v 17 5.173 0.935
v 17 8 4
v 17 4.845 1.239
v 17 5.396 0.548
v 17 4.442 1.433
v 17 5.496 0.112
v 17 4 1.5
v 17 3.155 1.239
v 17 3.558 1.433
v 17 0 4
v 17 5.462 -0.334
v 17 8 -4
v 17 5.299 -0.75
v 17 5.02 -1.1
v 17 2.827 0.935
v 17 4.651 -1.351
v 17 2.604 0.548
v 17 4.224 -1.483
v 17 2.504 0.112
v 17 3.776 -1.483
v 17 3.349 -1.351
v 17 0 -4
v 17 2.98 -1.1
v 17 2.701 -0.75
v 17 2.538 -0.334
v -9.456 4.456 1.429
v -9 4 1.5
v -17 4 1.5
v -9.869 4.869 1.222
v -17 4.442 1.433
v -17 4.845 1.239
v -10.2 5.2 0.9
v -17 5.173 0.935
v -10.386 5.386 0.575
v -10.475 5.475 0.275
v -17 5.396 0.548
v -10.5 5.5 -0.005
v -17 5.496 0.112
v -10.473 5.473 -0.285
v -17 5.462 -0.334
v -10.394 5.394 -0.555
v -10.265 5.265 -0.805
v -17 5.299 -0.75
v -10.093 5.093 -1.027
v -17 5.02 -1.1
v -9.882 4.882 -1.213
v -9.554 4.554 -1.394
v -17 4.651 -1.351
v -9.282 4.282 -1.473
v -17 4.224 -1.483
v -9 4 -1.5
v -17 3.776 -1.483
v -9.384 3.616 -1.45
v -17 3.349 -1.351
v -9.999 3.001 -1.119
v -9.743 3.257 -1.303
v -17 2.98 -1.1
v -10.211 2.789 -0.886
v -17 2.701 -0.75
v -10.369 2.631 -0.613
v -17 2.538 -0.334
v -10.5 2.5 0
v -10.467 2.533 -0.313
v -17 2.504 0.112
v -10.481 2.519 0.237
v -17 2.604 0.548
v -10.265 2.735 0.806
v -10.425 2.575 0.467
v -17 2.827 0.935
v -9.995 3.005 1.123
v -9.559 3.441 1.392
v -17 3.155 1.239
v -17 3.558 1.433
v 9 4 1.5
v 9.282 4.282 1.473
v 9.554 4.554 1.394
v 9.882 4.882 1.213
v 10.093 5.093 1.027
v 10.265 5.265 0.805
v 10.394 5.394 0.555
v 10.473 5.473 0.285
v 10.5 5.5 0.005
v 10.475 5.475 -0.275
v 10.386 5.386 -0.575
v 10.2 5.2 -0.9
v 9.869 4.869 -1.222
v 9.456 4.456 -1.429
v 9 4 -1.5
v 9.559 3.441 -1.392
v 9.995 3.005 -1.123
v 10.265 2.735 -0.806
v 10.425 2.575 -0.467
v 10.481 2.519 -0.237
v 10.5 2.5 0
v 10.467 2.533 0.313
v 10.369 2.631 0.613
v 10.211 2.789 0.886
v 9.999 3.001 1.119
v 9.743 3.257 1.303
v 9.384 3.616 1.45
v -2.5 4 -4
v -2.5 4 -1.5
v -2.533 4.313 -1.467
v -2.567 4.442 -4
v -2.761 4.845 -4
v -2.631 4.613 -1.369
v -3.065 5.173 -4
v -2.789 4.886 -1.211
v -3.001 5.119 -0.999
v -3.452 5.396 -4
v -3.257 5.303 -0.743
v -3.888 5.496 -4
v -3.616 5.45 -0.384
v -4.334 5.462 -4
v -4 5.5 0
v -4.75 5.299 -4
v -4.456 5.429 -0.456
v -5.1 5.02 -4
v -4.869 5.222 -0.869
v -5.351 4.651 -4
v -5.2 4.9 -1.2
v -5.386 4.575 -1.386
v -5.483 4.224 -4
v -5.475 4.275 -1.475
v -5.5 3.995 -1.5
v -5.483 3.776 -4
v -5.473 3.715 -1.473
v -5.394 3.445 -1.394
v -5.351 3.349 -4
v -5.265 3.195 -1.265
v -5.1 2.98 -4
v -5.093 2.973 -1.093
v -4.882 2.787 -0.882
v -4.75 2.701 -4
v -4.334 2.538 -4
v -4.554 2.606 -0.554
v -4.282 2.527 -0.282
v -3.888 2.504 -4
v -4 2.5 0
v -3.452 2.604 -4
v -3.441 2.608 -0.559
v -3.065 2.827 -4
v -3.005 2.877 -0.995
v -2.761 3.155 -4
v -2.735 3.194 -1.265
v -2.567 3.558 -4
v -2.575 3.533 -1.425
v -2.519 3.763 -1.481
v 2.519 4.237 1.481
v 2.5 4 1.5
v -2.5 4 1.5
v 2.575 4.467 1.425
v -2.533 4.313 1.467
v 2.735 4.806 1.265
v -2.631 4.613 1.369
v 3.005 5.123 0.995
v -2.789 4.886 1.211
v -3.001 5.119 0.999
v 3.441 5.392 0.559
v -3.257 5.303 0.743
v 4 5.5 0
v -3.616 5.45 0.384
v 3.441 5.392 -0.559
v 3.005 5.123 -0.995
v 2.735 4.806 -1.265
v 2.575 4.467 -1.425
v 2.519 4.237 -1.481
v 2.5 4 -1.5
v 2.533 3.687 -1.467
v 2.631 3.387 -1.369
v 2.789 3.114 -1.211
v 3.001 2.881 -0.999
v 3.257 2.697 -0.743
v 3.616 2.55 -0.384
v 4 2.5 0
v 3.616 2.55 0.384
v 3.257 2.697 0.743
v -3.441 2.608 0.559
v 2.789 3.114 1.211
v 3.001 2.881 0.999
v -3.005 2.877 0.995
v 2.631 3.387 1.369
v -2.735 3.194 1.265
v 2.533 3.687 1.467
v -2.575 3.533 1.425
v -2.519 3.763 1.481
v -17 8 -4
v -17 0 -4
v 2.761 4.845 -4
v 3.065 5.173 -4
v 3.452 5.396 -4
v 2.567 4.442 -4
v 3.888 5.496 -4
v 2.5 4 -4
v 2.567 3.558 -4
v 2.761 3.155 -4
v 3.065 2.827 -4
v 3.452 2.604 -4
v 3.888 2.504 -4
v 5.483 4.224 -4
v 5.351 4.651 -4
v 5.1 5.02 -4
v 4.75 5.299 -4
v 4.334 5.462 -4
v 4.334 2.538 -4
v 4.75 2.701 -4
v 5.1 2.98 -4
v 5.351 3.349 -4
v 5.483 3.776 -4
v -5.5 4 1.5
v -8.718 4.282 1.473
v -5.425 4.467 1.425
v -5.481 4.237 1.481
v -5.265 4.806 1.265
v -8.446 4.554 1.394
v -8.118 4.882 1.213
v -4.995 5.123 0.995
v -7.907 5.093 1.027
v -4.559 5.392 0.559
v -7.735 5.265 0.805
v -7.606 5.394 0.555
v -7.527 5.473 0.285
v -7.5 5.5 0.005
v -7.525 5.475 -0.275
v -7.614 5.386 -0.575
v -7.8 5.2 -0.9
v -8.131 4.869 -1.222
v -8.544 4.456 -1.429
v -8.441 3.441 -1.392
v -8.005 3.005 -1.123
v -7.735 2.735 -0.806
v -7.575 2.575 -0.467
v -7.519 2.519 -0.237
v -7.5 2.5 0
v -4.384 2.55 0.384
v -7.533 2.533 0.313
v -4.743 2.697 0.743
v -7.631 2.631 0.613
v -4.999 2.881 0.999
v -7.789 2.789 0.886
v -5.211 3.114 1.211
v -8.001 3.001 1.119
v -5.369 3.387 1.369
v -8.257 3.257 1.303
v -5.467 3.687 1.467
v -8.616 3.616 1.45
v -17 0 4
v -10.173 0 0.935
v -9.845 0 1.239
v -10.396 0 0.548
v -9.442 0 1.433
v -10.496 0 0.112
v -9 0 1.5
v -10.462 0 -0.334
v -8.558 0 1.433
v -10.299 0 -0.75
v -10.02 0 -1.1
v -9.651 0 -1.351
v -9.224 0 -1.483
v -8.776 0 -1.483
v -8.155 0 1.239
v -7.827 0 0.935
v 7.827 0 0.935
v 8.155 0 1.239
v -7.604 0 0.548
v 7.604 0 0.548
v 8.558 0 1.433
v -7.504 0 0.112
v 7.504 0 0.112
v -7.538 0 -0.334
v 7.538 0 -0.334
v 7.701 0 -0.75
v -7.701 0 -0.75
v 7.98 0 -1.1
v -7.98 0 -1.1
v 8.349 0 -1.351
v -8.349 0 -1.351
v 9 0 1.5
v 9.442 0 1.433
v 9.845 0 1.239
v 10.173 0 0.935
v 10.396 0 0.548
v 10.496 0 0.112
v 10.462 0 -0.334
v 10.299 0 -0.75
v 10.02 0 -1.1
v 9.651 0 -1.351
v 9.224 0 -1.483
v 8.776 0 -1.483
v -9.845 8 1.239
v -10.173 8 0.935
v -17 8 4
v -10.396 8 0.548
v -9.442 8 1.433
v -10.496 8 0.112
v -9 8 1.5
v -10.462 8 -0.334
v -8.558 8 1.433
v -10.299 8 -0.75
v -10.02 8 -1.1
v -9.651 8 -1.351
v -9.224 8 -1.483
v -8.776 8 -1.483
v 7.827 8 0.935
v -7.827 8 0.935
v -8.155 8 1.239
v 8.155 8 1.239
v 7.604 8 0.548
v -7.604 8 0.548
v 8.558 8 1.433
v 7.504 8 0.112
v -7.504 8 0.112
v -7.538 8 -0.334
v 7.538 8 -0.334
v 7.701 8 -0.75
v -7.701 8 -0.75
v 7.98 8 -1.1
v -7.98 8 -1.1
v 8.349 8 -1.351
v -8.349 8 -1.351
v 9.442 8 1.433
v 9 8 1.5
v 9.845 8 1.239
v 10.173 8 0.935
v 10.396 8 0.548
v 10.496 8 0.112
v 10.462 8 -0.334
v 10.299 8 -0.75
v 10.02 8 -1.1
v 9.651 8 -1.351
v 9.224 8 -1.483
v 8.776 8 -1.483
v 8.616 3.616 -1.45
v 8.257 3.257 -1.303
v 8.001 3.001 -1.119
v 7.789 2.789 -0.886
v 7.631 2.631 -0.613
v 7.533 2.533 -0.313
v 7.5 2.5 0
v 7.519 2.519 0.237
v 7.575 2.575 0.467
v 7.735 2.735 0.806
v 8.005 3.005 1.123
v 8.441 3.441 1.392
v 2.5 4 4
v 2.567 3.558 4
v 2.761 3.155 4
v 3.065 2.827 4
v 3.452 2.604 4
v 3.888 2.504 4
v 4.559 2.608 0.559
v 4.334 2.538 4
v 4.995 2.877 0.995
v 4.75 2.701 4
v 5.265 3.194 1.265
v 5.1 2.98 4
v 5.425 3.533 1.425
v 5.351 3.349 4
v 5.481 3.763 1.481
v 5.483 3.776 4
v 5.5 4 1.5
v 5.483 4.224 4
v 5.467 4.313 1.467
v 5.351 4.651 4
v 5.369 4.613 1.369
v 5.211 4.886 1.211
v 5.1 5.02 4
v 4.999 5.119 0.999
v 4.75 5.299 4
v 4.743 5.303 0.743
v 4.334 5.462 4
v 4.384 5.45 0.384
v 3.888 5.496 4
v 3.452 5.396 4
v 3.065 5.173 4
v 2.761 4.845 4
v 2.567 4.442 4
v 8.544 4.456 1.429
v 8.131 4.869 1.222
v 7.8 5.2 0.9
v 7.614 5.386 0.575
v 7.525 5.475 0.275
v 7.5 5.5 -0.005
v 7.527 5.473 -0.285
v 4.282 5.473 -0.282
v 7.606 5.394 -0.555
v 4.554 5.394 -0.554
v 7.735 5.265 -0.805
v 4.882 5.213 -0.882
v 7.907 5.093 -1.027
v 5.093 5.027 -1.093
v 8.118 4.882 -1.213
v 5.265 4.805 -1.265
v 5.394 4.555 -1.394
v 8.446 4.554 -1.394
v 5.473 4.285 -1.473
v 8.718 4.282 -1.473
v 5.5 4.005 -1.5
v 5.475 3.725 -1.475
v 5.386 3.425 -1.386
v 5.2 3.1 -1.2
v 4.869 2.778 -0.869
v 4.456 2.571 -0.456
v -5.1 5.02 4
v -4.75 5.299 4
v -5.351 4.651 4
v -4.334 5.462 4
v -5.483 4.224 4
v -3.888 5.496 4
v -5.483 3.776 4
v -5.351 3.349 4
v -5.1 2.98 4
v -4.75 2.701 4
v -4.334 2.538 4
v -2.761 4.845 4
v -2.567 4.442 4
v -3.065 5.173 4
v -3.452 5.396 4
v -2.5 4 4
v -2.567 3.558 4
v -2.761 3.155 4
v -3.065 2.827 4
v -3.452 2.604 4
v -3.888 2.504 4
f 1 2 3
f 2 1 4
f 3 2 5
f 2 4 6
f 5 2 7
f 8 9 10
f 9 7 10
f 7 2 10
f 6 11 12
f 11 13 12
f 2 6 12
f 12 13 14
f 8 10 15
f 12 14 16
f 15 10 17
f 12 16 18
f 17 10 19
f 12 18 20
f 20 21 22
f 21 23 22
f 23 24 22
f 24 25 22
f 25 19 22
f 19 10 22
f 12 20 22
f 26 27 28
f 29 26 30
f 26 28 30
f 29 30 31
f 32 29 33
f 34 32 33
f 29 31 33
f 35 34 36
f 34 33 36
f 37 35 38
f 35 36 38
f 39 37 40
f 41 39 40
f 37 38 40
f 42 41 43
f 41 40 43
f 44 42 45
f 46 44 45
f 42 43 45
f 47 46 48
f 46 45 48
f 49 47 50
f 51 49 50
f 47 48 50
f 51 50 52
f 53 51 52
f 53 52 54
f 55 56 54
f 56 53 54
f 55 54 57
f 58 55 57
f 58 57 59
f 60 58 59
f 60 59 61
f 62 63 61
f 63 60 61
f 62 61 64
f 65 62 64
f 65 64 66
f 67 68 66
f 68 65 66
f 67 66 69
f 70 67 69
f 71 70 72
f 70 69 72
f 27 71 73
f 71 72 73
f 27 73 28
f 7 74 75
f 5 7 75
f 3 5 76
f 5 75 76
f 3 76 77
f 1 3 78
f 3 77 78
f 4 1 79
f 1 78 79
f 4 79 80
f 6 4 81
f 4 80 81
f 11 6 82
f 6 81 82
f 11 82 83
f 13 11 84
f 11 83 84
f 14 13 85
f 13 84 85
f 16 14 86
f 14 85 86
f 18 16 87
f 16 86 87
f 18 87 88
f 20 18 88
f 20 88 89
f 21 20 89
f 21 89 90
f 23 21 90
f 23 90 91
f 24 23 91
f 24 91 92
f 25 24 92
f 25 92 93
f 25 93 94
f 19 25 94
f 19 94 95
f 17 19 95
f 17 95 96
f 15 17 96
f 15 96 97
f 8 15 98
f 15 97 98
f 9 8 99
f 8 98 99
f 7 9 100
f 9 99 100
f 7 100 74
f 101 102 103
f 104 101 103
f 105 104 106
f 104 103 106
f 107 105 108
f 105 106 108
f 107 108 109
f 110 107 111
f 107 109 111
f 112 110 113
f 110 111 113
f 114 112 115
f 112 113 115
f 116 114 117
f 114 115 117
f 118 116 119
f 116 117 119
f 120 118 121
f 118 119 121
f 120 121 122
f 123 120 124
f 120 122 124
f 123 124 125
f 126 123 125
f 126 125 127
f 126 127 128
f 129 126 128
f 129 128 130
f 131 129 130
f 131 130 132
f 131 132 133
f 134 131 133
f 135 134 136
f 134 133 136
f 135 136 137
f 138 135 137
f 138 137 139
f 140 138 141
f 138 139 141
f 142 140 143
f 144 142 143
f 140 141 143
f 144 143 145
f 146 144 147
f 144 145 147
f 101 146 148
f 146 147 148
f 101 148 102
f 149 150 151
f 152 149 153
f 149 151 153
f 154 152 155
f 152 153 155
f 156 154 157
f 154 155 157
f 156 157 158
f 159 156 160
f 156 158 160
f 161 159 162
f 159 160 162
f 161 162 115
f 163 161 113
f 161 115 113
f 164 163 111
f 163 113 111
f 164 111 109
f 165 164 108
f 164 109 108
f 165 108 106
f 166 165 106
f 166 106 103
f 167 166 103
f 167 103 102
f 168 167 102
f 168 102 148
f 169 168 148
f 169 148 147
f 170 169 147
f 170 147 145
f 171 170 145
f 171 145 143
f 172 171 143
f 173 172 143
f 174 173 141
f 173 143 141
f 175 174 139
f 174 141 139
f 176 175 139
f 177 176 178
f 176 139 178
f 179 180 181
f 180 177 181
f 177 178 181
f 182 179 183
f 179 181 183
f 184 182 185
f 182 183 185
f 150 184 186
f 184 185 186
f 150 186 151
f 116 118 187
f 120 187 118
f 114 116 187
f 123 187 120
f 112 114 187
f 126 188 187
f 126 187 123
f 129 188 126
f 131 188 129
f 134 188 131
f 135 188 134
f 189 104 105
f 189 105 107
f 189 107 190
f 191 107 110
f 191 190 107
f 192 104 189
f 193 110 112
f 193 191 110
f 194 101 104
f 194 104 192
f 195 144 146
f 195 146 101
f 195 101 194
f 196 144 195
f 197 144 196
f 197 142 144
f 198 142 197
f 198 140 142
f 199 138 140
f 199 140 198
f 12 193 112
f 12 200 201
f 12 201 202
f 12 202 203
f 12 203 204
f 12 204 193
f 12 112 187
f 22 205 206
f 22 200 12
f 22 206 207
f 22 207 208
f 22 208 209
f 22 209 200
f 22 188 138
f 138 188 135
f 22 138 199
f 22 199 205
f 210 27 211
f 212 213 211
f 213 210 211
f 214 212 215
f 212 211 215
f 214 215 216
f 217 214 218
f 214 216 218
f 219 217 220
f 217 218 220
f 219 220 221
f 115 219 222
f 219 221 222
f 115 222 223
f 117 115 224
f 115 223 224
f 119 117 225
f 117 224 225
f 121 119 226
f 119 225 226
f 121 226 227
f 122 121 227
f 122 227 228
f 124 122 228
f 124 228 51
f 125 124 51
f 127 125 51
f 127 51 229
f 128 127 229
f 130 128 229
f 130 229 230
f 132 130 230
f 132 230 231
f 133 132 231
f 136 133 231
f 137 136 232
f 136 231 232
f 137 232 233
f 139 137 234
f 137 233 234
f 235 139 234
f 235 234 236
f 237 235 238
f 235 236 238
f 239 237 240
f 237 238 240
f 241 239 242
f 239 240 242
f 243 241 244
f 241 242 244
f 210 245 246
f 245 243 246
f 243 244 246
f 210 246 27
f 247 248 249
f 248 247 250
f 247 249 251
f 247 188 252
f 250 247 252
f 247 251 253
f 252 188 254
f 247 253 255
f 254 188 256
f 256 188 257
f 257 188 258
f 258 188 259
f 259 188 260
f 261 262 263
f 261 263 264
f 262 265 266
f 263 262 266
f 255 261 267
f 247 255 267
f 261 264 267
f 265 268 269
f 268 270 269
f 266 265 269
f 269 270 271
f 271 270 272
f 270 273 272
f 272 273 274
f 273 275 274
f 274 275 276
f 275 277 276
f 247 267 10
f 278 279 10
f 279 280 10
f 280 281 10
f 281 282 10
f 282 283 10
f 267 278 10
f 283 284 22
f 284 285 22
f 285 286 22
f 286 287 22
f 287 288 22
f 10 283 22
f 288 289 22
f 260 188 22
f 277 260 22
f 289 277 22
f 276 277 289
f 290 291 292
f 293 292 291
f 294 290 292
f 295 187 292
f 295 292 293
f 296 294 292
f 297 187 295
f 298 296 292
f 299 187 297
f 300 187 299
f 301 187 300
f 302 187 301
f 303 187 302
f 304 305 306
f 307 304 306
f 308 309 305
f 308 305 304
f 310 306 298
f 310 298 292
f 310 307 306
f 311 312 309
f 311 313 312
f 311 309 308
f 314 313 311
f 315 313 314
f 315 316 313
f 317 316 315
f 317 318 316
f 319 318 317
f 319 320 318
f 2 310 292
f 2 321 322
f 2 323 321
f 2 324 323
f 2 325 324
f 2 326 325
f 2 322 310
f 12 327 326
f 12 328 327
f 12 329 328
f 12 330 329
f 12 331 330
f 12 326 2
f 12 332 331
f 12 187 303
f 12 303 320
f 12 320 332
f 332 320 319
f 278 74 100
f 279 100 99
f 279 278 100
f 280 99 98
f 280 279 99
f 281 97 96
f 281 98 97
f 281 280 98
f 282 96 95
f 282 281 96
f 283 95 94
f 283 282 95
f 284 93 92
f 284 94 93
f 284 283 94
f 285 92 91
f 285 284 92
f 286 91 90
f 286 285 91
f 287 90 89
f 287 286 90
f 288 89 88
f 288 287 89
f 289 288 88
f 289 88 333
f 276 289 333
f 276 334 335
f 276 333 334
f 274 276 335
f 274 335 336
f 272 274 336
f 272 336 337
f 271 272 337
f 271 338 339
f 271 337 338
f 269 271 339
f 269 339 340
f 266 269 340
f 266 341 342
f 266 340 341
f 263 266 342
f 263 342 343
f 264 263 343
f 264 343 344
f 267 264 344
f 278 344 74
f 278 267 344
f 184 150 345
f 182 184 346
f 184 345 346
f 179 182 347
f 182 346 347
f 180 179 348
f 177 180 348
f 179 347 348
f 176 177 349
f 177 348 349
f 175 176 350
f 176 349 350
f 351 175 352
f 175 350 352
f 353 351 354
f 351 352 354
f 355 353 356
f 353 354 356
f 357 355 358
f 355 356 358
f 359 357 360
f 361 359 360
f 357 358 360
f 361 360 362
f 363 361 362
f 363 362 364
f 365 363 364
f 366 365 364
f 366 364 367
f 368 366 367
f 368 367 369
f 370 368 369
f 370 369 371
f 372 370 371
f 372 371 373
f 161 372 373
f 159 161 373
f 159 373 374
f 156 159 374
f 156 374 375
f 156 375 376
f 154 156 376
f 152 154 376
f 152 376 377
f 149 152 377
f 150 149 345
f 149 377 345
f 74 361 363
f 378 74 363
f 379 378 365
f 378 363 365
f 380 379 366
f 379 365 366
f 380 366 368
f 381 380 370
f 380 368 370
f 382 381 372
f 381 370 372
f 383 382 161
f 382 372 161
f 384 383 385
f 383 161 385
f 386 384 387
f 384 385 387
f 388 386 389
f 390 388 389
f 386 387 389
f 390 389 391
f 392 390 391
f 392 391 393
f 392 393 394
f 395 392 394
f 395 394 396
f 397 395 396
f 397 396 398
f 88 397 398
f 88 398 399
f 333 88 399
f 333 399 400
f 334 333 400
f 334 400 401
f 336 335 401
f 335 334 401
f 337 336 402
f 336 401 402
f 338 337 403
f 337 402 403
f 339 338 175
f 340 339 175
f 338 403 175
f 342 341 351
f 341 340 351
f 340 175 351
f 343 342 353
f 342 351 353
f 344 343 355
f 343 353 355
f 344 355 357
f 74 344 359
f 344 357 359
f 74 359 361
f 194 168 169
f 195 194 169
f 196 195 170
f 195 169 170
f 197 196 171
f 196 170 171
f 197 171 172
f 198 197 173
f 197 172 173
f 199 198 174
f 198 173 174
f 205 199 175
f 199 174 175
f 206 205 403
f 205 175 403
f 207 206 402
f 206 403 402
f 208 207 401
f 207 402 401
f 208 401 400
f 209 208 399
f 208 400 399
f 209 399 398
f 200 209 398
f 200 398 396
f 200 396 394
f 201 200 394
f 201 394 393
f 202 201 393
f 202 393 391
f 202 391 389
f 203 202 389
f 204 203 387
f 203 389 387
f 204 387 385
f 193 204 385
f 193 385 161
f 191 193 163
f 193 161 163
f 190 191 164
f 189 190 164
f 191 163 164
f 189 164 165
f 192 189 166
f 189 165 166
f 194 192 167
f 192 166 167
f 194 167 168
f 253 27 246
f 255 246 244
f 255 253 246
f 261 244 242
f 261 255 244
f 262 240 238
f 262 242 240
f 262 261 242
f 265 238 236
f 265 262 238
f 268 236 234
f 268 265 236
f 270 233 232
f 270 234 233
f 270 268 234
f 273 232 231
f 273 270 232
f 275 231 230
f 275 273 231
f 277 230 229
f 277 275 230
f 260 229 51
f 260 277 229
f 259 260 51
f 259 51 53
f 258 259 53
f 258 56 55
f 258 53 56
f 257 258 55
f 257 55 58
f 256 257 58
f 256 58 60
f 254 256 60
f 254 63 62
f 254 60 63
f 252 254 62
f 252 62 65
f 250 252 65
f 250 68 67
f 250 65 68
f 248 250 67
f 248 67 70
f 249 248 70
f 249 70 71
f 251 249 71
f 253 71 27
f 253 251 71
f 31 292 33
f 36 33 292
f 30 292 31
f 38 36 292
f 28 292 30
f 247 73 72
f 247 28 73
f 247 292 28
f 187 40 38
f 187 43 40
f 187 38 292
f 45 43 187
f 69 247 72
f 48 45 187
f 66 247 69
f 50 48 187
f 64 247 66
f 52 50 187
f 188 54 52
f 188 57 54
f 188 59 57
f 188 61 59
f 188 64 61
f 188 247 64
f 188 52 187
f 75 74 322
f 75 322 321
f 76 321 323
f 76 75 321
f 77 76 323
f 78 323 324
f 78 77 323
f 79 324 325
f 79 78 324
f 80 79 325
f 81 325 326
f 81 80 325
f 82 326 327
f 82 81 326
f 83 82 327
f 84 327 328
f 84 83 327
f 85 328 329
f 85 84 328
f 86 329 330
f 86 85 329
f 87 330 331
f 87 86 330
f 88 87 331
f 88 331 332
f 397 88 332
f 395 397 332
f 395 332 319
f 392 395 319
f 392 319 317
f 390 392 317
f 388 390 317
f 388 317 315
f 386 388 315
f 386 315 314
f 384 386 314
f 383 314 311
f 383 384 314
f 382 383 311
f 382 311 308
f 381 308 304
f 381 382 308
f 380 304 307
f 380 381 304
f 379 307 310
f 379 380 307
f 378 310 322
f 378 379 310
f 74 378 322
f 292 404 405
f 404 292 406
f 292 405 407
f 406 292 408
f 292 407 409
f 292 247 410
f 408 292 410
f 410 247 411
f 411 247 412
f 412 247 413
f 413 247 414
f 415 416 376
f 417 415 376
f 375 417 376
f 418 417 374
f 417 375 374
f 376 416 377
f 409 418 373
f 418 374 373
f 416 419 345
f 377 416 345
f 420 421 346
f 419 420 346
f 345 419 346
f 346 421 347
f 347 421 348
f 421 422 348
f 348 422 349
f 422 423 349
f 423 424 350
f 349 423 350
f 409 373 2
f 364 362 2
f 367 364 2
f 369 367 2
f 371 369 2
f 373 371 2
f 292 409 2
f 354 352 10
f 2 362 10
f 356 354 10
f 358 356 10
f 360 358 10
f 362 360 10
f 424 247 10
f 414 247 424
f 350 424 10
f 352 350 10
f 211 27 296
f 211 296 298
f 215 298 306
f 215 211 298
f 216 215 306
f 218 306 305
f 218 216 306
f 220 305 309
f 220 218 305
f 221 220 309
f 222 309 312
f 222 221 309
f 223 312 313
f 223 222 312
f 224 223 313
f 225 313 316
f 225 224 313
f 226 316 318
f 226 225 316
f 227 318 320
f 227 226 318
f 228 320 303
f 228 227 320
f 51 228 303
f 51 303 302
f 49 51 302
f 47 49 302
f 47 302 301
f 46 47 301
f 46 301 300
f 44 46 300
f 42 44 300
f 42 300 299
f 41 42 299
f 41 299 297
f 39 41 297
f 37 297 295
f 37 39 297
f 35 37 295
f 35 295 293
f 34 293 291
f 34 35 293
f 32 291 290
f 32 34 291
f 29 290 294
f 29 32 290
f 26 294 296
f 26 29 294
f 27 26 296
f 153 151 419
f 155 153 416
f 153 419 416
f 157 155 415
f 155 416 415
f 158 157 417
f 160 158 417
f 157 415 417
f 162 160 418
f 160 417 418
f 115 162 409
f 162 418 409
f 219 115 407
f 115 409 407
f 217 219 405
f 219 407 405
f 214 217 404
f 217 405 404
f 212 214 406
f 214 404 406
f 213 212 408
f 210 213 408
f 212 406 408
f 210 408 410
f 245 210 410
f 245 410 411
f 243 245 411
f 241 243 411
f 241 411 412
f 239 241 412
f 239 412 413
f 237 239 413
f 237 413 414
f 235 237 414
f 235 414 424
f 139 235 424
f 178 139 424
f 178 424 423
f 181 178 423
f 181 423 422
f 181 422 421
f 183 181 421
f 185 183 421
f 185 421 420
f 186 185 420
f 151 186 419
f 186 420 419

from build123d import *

# Parameters (mm, degrees)
SKETCH_1_W          = 34
SKETCH_1_H          = 8
SKETCH_1_R          = 1.5
EXTRUDE_1_DEPTH     = 8
SKETCH_2_R          = 1.5
CUT_EXTRUDE_1_DEPTH = 8
SKETCH_3_R          = 1.5
CUT_EXTRUDE_2_DEPTH = 39


with BuildPart() as part:
    # 草图1 → 凸台-拉伸1 (new body)
    with BuildSketch(Plane(origin=(0, 0, 0), x_dir=(1, 0, 0), z_dir=(0, 1, 0))):
        Rectangle(SKETCH_1_W, SKETCH_1_H)
        with Locations(Location((-9, 0, 0), (0, 0, 270))):
            Circle(SKETCH_1_R, mode=Mode.SUBTRACT)
        with Locations(Location((9, 0, 0), (0, 0, 270))):
            Circle(SKETCH_1_R, mode=Mode.SUBTRACT)
    extrude(amount=EXTRUDE_1_DEPTH)

    # 草图2 → 切除-拉伸1 (cut)
    with BuildSketch(Plane.XY.offset(4)):
        with Locations((-4, 4)):
            Circle(SKETCH_2_R)
        with Locations(Location((4, 4, 0), (0, 0, 180))):
            Circle(SKETCH_2_R)
    extrude(amount=-CUT_EXTRUDE_1_DEPTH, mode=Mode.SUBTRACT)

    # 草图3 → 切除-拉伸2 (cut)
    with BuildSketch(Plane.ZY.offset(17)):
        with Locations((0, 4)):
            Circle(SKETCH_3_R)
    extrude(amount=-CUT_EXTRUDE_2_DEPTH, mode=Mode.SUBTRACT)


solid = part.part
